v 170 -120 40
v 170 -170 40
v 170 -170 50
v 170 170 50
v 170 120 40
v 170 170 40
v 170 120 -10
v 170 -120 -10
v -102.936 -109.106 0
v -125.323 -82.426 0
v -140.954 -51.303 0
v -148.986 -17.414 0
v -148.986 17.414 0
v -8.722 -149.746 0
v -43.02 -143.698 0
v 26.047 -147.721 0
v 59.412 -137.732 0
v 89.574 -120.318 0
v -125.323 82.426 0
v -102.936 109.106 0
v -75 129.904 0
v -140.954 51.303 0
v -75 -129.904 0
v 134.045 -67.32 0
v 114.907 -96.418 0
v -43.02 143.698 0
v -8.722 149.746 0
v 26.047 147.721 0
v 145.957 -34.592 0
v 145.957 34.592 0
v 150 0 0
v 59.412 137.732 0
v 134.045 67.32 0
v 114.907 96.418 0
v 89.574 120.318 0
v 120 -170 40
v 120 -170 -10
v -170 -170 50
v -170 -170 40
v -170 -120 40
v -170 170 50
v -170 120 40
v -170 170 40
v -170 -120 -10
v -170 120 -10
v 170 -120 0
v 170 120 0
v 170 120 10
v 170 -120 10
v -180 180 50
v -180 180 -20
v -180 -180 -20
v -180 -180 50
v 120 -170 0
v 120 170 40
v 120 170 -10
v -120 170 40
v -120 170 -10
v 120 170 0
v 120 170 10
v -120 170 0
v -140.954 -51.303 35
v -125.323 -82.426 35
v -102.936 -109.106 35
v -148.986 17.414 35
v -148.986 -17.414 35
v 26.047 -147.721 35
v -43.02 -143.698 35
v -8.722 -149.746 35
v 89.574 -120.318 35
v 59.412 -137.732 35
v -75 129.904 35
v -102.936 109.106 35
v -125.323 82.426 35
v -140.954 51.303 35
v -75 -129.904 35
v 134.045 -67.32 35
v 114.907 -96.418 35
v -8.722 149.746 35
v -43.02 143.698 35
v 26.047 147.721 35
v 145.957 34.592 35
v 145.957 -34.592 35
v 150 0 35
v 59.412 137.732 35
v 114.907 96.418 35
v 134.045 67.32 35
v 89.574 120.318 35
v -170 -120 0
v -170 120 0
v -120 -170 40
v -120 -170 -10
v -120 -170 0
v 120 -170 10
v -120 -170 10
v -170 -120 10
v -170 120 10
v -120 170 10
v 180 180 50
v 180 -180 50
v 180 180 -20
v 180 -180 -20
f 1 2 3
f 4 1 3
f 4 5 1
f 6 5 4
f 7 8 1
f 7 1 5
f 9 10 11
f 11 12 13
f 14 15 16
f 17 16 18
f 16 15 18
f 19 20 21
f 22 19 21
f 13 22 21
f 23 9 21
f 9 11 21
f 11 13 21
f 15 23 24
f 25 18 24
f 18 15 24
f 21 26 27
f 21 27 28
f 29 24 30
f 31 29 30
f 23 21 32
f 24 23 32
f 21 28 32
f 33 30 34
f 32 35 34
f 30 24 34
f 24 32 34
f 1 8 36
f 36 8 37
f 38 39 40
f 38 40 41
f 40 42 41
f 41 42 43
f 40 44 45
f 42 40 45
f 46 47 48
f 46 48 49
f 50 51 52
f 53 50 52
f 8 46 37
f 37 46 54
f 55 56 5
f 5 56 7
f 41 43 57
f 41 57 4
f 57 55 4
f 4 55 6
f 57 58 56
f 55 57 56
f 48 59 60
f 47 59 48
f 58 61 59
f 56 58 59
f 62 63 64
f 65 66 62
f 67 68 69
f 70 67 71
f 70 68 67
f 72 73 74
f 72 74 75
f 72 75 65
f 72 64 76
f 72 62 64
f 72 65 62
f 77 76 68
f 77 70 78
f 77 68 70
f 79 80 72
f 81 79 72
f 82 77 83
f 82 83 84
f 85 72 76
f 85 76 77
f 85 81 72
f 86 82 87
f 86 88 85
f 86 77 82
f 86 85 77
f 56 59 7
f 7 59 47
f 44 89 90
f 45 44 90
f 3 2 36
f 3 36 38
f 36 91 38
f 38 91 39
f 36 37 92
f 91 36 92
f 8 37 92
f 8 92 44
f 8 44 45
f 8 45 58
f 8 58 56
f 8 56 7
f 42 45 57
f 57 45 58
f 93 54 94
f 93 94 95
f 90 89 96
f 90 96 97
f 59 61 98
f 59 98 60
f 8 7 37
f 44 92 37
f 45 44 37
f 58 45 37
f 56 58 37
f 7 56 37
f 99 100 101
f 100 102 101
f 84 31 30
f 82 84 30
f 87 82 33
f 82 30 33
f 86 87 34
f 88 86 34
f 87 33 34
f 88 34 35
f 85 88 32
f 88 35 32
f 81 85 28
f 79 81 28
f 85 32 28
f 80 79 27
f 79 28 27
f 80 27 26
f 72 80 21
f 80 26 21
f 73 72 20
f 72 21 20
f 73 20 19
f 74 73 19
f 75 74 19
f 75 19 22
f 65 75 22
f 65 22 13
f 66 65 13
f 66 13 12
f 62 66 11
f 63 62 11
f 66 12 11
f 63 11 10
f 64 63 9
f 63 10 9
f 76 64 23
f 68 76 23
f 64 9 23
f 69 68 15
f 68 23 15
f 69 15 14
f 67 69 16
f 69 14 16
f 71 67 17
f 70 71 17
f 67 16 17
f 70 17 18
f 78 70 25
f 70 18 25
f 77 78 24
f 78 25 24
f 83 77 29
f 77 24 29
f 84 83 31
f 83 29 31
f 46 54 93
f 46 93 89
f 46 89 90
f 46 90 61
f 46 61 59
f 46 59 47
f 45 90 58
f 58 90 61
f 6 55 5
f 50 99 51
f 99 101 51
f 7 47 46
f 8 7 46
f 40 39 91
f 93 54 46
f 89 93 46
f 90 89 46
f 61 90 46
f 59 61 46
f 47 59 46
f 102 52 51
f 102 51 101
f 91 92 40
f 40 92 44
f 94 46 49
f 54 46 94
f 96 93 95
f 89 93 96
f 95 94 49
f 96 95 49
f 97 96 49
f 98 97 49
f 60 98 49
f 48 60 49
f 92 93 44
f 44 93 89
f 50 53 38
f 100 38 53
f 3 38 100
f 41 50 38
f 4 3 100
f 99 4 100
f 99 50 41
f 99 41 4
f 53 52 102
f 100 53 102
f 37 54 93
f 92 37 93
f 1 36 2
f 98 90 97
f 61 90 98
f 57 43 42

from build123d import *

# Parameters (mm, degrees)
F1_R      = 150
F2_DEPTH  = 35
F3_R      = 150
F4_DEPTH  = 10
F5_DEPTH  = 10
F6_W      = 360
F6_H      = 360
F7_DEPTH  = 10
F8_W      = 10
F8_H      = 340
F9_DEPTH  = 60
F11_DEPTH = 50


with BuildPart() as f2:
    # F1 (on Top) → F2 (new body)
    with BuildSketch(Plane.XY):
        Circle(F1_R)
    extrude(amount=F2_DEPTH)


with BuildPart() as f4:
    # F3 (on face) → F4 (new body)
    with BuildSketch(Plane(origin=(0, 0, 0), x_dir=(1, 0, 0), z_dir=(0, 0, -1))):
        Polygon((120, 170), (-120, 170), (-170, 120), (-170, -120), (-120, -170), (120, -170), (170, -120), (170, 120), align=None)
        Circle(F3_R, mode=Mode.SUBTRACT)
        Circle(F3_R)
    extrude(amount=F4_DEPTH)


with BuildPart() as f5:
    # F5 (new): a face of the model
    f5_faces = [f4.part.faces().sort_by_distance(p)[0] for p in [
        (0, 0, 0),
    ]]
    extrude(f5_faces, amount=F5_DEPTH)


with BuildPart() as f7:
    # F6 (on face) → F7 (new body)
    with BuildSketch(Plane(origin=(0, 0, -10), x_dir=(1, 0, 0), z_dir=(0, 0, -1))):
        Rectangle(F6_W, F6_H)
        Polygon((-120, 170), (120, 170), (170, 120), (170, -120), (120, -170), (-120, -170), (-170, -120), (-170, 120), align=None, mode=Mode.SUBTRACT)
        Polygon((170, 120), (120, 170), (-120, 170), (-170, 120), (-170, -120), (-120, -170), (120, -170), (170, -120), align=None)
    extrude(amount=F7_DEPTH)

    # F8 (on face) → F9 (join)
    with BuildSketch(Plane.XY.offset(-10)):
        Polygon((-180, -170), (-180, -180), (180, -180), (180, -170), (170, -170), (-170, -170), align=None)
        with Locations((-175, 0)):
            Rectangle(F8_W, F8_H)
        Polygon((-180, 180), (-180, 170), (-170, 170), (170, 170), (180, 170), (180, 180), align=None)
        with Locations((175, 0)):
            Rectangle(F8_W, F8_H)
    extrude(amount=F9_DEPTH)

    # F10 (on face) → F11 (join)
    with BuildSketch(Plane.XY.offset(-10)):
        Polygon((-170, -170), (-120, -170), (-170, -120), align=None)
        Polygon((120, -170), (170, -170), (170, -120), align=None)
        Polygon((120, 170), (170, 120), (170, 170), align=None)
        Polygon((-170, 170), (-170, 120), (-120, 170), align=None)
    extrude(amount=F11_DEPTH)


solid = Compound([f2.part, f4.part, f5.part, f7.part])
